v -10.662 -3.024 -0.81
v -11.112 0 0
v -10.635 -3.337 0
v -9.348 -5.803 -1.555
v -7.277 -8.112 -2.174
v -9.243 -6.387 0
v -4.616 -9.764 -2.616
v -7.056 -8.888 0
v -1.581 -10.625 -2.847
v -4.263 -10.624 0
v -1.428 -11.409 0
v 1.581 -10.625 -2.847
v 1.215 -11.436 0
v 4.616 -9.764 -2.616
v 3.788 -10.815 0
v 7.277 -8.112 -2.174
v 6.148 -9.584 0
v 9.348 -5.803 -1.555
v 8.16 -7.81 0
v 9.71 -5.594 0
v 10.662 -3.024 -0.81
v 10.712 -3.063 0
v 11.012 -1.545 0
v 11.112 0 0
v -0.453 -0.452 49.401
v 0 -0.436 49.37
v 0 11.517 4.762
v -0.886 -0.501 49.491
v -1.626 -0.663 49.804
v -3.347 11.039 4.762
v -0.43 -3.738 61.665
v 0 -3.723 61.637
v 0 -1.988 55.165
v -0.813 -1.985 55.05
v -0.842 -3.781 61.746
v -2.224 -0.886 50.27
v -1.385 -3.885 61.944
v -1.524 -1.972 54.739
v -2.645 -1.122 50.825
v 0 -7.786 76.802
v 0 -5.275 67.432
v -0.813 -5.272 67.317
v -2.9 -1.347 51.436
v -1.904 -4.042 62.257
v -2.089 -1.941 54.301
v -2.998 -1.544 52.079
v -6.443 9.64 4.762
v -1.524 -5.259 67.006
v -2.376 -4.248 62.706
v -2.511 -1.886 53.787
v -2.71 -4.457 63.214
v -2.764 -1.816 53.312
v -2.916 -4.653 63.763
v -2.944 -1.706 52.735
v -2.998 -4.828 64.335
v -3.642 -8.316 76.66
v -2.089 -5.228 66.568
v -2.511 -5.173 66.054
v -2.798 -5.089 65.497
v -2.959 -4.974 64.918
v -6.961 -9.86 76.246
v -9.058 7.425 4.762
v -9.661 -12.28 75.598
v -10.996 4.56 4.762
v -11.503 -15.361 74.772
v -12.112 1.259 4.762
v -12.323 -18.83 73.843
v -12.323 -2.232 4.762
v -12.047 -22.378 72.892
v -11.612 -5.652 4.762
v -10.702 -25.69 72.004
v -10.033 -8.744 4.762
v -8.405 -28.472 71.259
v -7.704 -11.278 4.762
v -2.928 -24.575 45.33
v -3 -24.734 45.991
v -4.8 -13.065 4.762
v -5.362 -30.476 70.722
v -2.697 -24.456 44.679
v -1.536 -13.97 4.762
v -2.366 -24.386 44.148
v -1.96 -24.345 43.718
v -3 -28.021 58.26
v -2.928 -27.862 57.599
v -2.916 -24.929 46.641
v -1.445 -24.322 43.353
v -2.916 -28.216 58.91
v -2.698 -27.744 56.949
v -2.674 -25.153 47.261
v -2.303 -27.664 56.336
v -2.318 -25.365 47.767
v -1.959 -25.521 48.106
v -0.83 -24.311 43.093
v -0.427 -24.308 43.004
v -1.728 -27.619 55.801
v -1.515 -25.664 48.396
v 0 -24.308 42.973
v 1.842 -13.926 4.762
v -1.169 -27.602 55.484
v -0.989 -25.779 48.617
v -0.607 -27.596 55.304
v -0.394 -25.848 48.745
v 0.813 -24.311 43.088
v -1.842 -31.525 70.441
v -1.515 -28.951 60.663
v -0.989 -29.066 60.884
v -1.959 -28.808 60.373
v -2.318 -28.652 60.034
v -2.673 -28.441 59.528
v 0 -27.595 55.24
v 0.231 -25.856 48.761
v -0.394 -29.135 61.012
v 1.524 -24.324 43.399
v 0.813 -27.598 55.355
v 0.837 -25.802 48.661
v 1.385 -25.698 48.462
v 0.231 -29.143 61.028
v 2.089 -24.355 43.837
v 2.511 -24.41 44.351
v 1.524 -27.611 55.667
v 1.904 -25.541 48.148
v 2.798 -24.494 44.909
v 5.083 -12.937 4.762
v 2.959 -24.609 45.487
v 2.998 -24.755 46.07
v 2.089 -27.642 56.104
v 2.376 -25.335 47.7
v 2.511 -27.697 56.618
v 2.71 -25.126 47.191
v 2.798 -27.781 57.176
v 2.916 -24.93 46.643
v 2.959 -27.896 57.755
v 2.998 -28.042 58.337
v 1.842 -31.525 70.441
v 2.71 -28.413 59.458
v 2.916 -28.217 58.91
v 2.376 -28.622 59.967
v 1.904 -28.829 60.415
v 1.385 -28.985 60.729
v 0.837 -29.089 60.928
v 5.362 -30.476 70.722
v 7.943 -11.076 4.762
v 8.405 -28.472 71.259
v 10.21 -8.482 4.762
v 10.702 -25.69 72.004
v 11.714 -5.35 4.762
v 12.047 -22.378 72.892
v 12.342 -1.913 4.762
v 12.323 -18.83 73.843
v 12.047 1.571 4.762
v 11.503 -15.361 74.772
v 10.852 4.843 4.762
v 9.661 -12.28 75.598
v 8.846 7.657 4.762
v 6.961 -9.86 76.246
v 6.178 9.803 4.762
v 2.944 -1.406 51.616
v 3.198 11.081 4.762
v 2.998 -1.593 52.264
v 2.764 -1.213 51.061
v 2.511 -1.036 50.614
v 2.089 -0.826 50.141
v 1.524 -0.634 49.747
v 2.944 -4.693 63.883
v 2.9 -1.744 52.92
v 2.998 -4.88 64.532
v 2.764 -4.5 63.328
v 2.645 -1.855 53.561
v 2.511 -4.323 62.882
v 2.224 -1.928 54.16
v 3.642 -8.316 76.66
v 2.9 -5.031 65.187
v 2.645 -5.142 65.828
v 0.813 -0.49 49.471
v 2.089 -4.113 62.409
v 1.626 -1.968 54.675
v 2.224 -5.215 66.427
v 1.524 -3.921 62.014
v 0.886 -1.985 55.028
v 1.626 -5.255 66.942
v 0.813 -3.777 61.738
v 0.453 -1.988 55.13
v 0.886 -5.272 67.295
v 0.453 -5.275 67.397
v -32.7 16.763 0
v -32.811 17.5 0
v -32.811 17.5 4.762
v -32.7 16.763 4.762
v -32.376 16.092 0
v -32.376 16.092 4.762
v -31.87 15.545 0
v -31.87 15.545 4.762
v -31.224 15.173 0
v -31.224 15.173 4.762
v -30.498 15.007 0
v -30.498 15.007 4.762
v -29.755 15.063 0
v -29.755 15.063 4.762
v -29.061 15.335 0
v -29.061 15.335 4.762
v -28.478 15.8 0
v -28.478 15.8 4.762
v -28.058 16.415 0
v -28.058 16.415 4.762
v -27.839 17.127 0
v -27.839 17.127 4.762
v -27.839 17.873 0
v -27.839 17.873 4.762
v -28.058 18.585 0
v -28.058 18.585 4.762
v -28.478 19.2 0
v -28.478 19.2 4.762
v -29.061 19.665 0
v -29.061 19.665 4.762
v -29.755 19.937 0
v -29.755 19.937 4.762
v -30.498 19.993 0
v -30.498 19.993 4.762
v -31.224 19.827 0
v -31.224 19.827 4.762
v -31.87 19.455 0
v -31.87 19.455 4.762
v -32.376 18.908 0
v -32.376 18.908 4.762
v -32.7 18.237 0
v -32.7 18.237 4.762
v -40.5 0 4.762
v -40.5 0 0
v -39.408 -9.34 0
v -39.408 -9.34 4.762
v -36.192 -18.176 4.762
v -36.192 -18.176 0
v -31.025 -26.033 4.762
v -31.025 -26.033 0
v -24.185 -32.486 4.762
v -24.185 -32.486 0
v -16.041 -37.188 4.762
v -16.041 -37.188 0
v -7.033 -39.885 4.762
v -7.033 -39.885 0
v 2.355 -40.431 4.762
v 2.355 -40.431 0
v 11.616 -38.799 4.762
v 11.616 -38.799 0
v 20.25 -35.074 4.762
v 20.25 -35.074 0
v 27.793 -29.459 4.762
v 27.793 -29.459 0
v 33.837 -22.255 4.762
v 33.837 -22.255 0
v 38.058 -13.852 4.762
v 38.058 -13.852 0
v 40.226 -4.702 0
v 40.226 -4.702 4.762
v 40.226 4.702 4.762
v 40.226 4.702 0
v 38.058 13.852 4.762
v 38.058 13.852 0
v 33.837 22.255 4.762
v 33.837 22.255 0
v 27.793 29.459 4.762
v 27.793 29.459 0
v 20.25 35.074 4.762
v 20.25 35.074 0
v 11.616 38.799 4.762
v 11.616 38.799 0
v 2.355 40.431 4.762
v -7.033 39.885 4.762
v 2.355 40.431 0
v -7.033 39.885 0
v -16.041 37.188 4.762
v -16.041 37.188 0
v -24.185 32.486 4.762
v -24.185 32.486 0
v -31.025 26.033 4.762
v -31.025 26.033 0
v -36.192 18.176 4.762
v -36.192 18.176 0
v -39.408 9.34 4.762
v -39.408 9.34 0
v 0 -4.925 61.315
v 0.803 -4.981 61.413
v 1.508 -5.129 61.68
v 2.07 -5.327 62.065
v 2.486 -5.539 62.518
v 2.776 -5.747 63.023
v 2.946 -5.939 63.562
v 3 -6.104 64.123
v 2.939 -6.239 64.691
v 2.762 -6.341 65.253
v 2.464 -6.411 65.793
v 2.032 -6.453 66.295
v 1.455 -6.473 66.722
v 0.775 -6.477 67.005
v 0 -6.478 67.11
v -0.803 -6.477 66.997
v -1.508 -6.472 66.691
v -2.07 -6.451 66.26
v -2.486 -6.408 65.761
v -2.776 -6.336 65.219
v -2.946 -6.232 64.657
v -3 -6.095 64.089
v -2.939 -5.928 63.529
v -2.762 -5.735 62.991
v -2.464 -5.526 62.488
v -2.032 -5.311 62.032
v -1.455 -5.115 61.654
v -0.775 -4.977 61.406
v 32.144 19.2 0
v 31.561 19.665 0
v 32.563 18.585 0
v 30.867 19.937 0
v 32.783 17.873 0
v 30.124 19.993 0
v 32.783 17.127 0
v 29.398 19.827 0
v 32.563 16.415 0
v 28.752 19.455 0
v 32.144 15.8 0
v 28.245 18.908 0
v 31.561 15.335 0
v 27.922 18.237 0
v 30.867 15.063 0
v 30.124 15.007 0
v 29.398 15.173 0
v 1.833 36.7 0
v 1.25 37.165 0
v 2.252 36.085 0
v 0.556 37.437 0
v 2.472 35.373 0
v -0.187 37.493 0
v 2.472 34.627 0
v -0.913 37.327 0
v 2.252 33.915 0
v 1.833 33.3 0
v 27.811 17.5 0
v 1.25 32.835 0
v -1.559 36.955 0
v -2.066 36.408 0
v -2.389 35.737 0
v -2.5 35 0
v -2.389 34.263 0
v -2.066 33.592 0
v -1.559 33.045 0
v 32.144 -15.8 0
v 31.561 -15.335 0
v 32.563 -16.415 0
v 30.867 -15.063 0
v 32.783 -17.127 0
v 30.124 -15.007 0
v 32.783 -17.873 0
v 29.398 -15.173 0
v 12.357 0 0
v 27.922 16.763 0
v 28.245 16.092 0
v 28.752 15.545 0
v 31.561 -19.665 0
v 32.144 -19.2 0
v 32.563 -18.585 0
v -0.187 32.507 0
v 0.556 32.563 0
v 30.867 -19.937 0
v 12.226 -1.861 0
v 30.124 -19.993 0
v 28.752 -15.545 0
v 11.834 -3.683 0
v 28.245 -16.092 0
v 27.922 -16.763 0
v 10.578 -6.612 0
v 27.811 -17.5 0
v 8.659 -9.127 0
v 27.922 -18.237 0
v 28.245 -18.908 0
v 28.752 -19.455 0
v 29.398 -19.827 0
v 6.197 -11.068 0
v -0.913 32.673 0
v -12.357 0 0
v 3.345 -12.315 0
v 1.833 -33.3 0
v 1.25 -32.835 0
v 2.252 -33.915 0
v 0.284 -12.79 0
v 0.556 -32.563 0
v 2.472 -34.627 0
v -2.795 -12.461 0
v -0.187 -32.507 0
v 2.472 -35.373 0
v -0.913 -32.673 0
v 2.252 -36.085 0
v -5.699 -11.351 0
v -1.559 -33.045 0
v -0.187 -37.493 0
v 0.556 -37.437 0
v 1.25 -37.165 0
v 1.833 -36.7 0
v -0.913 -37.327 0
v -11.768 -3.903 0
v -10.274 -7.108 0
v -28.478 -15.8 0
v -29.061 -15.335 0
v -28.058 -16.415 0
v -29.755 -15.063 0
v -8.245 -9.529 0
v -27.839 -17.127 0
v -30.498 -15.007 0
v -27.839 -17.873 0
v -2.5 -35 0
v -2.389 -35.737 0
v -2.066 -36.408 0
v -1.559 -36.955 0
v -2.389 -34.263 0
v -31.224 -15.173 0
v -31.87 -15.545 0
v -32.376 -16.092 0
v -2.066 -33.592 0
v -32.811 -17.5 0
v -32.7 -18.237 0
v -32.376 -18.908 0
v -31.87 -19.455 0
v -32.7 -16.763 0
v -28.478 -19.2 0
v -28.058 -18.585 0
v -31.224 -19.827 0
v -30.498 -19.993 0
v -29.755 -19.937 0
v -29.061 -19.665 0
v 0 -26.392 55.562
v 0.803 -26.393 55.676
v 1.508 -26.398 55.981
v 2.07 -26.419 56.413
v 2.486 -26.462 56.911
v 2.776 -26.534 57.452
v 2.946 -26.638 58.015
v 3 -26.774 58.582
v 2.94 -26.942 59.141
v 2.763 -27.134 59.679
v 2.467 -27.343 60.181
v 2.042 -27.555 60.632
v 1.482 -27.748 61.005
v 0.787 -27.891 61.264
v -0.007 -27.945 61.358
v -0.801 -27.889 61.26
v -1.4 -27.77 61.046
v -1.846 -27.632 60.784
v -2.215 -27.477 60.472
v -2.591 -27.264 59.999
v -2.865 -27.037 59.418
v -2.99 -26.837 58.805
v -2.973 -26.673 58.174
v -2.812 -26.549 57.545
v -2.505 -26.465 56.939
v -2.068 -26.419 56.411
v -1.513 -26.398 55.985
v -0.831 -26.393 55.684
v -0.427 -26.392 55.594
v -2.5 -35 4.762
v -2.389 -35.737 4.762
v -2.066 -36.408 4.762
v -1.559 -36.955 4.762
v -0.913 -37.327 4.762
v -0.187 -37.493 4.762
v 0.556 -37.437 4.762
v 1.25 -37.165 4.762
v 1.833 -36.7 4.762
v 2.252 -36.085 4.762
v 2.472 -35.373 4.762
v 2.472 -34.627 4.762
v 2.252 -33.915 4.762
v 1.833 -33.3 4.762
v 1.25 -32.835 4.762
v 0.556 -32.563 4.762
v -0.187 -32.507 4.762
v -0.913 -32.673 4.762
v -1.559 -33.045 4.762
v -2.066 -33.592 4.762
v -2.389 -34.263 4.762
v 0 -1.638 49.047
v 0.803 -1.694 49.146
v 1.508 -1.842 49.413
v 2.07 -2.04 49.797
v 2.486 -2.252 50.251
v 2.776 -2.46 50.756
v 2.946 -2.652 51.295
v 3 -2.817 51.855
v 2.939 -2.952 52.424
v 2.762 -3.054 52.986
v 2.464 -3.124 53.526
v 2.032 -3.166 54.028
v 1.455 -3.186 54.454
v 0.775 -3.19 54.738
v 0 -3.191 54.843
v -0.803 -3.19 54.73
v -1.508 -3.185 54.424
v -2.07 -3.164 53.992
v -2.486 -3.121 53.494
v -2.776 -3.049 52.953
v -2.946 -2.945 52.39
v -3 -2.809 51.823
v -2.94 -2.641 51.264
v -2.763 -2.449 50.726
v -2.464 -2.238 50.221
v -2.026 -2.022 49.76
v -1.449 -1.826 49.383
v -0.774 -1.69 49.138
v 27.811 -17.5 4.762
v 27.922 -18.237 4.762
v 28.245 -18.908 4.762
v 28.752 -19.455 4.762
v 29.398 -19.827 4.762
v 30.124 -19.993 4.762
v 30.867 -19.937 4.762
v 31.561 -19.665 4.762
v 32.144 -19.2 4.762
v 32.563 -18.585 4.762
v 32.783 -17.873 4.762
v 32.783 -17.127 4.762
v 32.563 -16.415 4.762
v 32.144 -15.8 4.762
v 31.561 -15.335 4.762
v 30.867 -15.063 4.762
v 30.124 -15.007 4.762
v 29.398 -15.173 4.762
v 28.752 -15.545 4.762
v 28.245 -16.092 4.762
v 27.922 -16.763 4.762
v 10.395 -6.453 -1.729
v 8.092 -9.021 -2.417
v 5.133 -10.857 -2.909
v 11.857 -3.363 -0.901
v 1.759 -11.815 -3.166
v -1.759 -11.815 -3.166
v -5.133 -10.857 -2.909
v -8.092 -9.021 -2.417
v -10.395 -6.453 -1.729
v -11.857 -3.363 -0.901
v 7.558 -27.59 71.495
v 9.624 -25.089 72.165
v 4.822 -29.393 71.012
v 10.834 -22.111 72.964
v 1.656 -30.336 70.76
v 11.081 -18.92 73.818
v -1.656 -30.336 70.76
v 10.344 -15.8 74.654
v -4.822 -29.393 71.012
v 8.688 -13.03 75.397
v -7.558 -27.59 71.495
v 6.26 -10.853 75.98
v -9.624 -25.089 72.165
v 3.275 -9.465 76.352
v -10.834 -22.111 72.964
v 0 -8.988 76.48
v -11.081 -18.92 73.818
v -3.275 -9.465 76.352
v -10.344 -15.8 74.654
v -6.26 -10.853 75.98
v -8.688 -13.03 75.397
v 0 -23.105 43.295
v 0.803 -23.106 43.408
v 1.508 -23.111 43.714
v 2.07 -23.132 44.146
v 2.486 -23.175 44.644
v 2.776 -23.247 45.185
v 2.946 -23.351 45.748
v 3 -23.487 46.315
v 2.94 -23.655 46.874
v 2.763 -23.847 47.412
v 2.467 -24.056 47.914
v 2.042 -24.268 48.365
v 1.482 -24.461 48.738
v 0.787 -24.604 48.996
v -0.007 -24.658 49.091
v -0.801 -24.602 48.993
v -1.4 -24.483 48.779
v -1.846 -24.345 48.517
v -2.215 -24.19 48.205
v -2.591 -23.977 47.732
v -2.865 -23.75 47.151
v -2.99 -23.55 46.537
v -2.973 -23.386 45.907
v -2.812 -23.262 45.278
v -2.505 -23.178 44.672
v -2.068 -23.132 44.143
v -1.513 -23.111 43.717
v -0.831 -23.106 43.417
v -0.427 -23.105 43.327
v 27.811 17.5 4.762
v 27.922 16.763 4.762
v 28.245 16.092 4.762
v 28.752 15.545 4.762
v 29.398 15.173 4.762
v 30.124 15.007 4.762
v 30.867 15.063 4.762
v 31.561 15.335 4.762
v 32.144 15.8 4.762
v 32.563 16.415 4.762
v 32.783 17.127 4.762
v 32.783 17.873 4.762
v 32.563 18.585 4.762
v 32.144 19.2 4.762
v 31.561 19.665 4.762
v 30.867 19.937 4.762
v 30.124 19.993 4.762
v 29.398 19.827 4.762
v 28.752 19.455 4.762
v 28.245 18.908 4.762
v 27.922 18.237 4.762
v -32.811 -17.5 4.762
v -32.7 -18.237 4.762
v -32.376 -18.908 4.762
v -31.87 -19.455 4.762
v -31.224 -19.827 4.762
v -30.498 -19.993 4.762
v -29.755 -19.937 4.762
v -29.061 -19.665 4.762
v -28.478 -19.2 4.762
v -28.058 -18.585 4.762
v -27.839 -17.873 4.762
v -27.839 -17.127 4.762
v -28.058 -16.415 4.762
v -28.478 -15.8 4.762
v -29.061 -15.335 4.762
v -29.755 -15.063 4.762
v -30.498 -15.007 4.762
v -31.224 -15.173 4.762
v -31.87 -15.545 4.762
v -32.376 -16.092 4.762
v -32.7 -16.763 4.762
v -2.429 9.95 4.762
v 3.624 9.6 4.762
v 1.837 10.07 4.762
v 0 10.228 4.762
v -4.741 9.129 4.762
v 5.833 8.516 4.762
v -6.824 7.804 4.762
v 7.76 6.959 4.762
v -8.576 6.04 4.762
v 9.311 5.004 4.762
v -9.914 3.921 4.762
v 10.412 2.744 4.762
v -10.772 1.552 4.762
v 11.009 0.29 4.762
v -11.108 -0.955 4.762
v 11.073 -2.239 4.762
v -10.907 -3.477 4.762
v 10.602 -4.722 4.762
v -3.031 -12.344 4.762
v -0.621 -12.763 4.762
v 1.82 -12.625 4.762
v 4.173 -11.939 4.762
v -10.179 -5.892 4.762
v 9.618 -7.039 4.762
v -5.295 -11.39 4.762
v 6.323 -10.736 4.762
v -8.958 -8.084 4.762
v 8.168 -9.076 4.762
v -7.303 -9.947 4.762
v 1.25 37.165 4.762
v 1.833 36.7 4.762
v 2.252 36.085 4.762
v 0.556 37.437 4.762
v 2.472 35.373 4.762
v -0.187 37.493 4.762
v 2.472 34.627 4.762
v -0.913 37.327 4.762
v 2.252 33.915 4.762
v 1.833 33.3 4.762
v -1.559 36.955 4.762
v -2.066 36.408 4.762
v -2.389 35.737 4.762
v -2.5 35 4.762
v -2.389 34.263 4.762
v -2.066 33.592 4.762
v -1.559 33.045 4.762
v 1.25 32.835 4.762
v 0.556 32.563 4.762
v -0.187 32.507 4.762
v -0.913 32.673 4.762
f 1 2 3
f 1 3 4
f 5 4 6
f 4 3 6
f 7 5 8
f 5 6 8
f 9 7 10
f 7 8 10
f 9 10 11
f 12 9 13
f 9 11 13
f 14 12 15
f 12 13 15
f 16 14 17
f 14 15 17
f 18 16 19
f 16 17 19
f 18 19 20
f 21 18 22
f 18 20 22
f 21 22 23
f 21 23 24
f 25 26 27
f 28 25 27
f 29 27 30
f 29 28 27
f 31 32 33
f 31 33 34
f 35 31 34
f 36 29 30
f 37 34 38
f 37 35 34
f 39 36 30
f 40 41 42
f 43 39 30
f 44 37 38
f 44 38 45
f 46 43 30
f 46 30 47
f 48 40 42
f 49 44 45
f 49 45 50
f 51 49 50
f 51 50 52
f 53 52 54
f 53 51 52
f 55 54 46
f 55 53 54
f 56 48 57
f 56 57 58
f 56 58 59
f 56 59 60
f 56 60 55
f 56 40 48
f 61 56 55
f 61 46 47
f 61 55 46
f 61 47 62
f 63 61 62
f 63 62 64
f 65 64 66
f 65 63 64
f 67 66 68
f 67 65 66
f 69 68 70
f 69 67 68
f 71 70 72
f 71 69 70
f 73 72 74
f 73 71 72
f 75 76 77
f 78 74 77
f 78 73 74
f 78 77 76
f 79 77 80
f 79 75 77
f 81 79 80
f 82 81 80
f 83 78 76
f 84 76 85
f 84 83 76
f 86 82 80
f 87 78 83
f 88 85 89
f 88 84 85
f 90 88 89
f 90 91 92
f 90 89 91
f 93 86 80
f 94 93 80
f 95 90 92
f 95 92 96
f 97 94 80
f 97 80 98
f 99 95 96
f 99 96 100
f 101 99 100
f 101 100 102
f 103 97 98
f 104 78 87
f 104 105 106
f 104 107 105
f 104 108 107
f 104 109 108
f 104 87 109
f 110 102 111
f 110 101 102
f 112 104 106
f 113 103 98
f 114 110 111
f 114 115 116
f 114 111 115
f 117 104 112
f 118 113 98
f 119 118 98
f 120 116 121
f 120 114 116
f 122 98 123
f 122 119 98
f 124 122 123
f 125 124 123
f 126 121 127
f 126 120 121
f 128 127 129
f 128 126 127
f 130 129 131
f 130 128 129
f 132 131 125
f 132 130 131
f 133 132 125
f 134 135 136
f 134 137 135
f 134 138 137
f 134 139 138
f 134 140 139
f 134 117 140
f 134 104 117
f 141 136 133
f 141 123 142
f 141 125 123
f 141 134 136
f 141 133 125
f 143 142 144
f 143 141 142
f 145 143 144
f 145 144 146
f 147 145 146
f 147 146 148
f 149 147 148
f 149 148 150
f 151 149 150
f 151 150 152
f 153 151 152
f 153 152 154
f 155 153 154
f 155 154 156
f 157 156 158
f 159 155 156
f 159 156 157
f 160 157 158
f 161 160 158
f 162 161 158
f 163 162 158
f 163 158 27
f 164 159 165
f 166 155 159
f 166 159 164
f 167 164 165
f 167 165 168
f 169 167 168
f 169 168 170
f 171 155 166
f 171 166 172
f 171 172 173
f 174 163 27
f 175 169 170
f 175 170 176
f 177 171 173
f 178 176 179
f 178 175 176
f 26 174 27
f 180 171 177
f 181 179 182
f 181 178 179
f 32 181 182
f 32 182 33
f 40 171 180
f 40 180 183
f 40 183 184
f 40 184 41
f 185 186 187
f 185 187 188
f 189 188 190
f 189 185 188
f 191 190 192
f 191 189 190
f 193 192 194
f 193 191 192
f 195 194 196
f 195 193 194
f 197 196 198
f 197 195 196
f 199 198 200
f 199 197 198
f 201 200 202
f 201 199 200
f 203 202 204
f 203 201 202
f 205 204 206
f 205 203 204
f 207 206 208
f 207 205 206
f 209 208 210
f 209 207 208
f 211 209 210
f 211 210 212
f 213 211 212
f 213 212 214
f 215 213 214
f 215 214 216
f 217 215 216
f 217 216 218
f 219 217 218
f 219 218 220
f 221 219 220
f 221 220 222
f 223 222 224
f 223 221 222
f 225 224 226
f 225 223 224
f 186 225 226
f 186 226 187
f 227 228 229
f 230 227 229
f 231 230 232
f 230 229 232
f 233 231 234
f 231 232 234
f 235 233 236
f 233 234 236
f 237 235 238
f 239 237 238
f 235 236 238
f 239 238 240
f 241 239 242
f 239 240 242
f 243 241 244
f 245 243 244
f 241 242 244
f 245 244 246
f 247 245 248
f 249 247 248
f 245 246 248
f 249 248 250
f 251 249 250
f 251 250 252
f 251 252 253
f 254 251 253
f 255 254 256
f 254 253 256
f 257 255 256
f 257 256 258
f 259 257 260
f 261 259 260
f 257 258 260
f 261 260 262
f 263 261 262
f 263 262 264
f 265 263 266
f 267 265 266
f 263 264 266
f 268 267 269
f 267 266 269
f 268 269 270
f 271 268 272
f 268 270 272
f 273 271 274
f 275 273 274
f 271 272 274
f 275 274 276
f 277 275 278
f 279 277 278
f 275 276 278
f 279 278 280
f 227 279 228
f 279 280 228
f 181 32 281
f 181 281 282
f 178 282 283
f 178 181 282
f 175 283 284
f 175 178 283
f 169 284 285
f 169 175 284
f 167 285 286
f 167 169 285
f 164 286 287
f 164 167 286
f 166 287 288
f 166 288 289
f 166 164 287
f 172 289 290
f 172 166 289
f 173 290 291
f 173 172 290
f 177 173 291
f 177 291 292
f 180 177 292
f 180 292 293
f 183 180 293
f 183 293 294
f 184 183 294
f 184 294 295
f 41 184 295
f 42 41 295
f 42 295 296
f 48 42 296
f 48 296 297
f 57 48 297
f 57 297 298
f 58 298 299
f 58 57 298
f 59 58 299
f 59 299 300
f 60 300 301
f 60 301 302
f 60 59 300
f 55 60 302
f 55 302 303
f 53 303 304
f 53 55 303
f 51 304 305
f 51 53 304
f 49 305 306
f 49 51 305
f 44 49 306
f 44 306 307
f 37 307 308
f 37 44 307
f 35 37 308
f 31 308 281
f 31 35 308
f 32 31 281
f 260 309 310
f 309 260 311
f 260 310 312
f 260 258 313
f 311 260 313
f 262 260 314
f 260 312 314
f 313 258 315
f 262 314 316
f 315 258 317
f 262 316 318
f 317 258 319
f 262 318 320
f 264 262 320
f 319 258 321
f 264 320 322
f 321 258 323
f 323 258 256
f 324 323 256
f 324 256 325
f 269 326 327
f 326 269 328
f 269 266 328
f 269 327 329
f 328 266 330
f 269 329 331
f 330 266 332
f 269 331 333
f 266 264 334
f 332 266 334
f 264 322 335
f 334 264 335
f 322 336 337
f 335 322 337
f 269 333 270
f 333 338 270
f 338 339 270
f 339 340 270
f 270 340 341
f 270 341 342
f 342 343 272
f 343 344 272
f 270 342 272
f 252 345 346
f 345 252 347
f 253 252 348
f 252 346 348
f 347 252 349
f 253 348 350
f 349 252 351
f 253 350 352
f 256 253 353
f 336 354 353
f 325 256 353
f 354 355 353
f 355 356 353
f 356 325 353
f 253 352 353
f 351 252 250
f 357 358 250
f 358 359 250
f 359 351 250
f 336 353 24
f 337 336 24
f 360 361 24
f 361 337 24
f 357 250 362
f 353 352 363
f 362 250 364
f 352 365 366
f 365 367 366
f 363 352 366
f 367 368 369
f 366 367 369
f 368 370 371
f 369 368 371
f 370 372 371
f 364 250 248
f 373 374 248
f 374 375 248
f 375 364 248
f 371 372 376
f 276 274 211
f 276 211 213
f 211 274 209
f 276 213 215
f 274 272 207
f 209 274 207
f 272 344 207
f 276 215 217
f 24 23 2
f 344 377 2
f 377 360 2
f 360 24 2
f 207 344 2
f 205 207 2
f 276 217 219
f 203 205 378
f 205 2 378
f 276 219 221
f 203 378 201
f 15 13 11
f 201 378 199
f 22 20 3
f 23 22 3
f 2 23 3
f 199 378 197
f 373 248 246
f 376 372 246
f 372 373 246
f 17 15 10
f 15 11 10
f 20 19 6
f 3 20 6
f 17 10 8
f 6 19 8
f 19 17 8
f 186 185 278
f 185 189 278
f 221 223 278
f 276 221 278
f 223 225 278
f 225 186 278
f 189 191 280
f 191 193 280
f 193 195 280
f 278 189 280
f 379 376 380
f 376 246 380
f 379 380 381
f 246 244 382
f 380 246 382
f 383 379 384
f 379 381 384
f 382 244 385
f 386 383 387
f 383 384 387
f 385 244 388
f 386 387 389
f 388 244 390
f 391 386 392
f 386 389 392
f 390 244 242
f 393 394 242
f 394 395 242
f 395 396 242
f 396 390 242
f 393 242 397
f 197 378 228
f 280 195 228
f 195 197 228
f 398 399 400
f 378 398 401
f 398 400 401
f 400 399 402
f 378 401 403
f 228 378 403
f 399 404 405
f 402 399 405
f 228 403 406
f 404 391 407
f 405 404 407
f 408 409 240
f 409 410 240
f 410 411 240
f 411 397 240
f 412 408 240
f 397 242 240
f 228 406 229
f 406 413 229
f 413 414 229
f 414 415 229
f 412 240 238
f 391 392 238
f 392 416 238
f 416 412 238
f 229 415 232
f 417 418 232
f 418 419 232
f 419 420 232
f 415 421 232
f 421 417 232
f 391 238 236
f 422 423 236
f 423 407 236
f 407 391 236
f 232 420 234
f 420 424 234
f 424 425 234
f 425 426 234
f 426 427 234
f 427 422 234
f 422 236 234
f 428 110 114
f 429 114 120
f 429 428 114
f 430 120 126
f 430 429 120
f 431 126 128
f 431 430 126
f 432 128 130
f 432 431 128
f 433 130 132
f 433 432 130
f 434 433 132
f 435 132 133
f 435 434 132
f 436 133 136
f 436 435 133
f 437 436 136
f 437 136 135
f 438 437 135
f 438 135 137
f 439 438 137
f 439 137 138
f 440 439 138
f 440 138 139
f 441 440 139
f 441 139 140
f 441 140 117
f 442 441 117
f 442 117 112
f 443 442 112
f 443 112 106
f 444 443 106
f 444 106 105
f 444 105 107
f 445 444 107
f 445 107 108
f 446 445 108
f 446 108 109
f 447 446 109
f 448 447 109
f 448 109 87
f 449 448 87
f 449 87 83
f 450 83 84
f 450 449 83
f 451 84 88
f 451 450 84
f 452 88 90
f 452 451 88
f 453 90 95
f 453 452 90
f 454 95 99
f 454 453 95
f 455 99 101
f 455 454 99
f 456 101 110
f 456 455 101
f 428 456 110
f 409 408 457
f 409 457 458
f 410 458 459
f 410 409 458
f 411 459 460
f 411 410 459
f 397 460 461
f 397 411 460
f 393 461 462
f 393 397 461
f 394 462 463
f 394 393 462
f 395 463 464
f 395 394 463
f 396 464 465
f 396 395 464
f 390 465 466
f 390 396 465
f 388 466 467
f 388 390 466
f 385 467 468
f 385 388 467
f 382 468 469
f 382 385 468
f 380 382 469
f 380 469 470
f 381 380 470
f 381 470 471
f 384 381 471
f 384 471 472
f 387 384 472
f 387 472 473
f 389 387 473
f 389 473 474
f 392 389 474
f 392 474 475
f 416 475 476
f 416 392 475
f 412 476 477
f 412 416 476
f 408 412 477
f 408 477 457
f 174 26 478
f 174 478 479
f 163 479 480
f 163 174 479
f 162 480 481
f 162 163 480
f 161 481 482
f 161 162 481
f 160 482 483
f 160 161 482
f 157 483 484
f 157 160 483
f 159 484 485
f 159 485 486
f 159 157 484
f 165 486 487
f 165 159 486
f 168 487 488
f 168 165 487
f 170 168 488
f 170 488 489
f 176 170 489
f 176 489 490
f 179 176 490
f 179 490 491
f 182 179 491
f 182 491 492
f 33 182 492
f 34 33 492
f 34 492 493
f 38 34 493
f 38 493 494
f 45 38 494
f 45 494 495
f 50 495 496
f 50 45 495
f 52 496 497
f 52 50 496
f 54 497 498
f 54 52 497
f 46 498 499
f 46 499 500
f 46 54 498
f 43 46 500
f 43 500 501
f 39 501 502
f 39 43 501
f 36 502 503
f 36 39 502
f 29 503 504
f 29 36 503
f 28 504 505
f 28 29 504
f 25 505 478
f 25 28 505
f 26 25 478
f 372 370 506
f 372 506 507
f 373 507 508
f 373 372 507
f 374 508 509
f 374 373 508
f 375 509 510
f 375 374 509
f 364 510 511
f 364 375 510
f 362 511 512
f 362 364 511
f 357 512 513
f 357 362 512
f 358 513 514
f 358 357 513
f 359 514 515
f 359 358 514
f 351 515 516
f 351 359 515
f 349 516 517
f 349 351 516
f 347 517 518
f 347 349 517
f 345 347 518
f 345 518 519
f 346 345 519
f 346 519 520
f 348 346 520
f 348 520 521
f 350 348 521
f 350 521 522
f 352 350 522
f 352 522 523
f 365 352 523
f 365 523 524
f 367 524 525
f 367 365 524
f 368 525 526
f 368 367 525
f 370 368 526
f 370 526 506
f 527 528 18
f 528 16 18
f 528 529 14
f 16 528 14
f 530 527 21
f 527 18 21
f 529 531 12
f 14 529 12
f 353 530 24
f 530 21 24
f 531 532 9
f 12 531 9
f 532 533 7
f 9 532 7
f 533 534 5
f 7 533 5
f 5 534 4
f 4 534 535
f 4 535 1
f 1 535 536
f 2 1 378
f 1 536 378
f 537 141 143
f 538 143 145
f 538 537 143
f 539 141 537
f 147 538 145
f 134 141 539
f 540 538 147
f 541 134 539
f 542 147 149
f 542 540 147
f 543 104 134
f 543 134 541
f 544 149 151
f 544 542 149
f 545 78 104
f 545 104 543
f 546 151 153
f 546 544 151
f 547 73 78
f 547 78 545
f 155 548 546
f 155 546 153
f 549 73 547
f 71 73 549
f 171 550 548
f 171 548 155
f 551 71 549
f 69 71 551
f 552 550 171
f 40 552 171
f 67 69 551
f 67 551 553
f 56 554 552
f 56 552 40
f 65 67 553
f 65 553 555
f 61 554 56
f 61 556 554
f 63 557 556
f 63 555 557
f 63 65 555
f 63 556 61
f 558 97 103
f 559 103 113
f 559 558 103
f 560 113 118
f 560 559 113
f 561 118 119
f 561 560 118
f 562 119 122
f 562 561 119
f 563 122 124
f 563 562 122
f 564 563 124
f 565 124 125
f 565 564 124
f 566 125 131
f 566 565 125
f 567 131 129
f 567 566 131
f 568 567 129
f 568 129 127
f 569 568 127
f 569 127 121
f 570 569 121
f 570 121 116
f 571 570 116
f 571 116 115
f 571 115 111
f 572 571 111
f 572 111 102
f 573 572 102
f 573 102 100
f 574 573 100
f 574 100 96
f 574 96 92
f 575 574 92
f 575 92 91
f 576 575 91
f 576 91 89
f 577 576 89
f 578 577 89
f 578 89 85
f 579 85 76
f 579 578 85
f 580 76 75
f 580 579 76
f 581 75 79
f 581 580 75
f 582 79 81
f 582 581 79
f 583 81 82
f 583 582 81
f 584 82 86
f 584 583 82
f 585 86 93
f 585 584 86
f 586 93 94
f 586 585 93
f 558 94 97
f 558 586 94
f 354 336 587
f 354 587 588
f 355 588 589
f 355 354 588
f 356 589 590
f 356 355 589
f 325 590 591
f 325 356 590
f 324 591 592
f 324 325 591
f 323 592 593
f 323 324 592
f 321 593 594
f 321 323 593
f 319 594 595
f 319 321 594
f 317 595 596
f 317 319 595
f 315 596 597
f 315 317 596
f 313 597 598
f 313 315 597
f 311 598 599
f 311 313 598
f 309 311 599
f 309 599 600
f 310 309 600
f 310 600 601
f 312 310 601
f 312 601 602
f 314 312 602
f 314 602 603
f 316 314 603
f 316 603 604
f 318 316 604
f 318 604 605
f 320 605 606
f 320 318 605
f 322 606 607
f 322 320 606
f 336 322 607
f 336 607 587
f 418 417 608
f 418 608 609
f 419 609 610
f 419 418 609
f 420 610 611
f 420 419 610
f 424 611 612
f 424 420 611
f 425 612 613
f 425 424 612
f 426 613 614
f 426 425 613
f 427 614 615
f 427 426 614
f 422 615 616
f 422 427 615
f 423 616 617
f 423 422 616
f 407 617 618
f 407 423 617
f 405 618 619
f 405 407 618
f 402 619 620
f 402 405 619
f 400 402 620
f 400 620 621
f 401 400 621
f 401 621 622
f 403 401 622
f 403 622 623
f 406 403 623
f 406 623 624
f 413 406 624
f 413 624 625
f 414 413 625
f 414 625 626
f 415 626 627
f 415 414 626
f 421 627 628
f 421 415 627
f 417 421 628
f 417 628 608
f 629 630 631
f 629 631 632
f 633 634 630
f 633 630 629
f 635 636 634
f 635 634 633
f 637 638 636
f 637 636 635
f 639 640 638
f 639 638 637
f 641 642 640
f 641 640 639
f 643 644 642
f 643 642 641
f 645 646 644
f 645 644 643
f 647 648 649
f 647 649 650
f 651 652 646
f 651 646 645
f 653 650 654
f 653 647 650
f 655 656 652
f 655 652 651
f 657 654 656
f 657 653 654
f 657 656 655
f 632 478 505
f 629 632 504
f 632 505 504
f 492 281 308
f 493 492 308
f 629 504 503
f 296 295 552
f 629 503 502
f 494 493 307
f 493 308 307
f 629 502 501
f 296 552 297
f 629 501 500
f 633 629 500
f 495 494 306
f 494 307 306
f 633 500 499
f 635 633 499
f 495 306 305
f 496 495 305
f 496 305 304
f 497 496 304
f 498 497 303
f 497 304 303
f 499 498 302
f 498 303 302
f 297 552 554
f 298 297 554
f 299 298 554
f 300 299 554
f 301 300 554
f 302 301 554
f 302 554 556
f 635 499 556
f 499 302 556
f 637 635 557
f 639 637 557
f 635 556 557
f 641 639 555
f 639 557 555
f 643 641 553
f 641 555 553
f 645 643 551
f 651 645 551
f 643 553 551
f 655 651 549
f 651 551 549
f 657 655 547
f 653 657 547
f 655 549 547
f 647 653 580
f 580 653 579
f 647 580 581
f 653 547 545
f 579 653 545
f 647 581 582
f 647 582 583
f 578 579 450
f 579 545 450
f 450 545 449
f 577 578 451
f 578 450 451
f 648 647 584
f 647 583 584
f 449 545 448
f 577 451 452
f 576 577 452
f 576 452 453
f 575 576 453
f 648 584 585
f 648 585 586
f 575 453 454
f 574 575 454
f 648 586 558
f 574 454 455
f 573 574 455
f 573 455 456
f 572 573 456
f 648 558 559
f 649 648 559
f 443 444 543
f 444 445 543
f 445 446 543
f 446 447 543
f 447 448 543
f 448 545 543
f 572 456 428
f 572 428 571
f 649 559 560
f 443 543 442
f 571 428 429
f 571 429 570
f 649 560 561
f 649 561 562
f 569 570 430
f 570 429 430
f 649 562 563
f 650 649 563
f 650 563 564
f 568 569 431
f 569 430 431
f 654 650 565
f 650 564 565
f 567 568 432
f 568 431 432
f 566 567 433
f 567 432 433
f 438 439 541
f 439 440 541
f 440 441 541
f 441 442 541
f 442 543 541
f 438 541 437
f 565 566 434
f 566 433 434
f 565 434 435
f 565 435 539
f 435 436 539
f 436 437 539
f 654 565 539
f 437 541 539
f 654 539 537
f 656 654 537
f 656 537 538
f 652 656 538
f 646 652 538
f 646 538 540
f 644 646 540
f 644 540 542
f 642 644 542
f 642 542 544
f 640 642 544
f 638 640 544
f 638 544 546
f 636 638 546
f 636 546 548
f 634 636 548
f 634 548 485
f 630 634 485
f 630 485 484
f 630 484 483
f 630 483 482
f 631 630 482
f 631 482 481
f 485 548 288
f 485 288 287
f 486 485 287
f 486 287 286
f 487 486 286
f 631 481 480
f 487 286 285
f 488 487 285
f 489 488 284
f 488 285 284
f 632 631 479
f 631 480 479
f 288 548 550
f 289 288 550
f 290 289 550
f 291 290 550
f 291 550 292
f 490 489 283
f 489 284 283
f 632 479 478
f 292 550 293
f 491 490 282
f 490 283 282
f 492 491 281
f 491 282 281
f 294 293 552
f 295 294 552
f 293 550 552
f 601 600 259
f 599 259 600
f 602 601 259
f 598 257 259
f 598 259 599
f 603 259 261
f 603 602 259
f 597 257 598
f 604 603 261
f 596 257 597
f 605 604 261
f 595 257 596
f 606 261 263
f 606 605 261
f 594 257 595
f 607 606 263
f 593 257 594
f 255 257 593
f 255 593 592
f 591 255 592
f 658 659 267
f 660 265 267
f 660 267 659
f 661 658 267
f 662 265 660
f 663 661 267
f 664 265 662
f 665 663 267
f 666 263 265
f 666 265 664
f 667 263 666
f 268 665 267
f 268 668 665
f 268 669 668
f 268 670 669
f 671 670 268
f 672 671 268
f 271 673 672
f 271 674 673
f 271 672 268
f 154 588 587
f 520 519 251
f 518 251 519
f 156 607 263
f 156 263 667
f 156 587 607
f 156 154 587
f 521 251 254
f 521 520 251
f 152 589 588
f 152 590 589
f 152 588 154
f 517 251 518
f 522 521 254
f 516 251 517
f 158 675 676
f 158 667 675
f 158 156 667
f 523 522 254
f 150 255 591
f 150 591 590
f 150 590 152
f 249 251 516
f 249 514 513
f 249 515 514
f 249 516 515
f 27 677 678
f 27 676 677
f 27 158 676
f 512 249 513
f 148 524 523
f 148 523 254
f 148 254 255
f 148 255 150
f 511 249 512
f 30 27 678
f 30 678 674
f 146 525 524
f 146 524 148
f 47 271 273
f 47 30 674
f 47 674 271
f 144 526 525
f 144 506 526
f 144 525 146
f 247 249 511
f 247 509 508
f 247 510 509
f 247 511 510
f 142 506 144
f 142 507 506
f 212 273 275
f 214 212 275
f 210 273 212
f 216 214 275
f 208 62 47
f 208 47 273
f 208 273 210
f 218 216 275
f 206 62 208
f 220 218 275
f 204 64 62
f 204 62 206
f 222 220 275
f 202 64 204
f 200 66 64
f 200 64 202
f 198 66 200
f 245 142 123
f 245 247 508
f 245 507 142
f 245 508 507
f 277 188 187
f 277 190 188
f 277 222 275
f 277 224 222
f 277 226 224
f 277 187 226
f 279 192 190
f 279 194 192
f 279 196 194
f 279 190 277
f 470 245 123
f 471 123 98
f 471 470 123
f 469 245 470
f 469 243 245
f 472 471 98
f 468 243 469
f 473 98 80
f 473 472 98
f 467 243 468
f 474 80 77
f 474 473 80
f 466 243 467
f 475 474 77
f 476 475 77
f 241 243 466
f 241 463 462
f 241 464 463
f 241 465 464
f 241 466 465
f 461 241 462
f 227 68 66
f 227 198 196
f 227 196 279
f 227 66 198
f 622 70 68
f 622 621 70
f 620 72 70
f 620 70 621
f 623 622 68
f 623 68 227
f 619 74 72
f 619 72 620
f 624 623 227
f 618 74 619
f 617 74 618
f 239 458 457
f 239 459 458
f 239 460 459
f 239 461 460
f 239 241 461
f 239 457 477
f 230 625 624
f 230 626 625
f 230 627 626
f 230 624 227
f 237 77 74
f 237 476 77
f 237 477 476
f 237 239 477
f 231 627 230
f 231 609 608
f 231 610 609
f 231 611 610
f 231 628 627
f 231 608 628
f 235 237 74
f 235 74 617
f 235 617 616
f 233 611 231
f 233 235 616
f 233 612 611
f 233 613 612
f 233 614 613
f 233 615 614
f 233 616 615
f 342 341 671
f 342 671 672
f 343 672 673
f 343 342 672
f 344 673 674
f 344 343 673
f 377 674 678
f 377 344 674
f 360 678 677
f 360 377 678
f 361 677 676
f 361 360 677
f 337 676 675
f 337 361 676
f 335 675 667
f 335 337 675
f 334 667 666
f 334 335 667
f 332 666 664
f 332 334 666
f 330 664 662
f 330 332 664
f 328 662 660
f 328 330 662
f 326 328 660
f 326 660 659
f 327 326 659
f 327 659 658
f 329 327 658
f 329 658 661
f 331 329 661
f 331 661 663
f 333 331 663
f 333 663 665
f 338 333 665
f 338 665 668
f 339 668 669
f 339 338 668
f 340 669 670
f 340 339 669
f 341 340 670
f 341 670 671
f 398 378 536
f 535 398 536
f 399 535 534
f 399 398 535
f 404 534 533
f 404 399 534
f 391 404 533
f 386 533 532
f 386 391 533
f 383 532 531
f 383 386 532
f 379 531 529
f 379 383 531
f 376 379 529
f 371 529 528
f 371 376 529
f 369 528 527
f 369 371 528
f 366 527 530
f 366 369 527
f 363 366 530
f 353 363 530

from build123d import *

# Parameters (mm, degrees)
SKETCH1_R               = 40.5
SKETCH1_R_2             = 2.5
BOSS_EXTRUDE1_DEPTH     = 4.7625
SWEEP_THIN1_PROFILE_R   = 12.3571
SWEEP_THIN1_PROFILE_R_2 = 11.1125
CUT_EXTRUDE2_DEPTH      = 96.807184511
CUT_EXTRUDE2_DEPTH_BACK = 96.807184511
SKETCH18_R              = 3


with BuildPart() as part:
    # Sketch1 → Boss-Extrude1 (new body)
    with BuildSketch(Plane.XY):
        with Locations(Location((0, 0, 0), (0, 0, 180))):
            Circle(SKETCH1_R)
        with Locations(Location((-30.310889132, -17.5, 0), (0, 0, 180))):
            Circle(SKETCH1_R_2, mode=Mode.SUBTRACT)
        with Locations(Location((0, -35, 0), (0, 0, 180))):
            Circle(SKETCH1_R_2, mode=Mode.SUBTRACT)
        with Locations(Location((30.310889132, -17.5, 0), (0, 0, 180))):
            Circle(SKETCH1_R_2, mode=Mode.SUBTRACT)
        with Locations(Location((30.310889132, 17.5, 0), (0, 0, 180))):
            Circle(SKETCH1_R_2, mode=Mode.SUBTRACT)
        with Locations(Location((0, 35, 0), (0, 0, 180))):
            Circle(SKETCH1_R_2, mode=Mode.SUBTRACT)
        with Locations(Location((-30.310889132, 17.5, 0), (0, 0, 180))):
            Circle(SKETCH1_R_2, mode=Mode.SUBTRACT)
    extrude(amount=BOSS_EXTRUDE1_DEPTH)

    # Sweep-Thin1: sweep along a path in Sketch6
    with BuildLine(Plane(origin=(0, 0, 0), x_dir=(0, 0, -1), z_dir=(1, 0, 0))) as sweep_thin1_path:
        Line((0, 0), (-73.603547963, -19.722011237))
    # Sweep-Thin1 profile (on start of the path) → Sweep-Thin1 (sweep)
    with BuildSketch(Plane(origin=(0, 0, 0), x_dir=(0, 0.965925826289069, 0.25881904510251813), z_dir=(0, -0.25881904510251813, 0.965925826289069))):
        Circle(SWEEP_THIN1_PROFILE_R)
        Circle(SWEEP_THIN1_PROFILE_R_2, mode=Mode.SUBTRACT)
    sweep(path=sweep_thin1_path.line)

    # Sketch18 → Cut-Extrude2 (cut, two sides: drawn at the far end of the back side and taken through both)
    with BuildSketch(Plane(origin=(0, 0, 0), x_dir=(-1, 0, 0), z_dir=(0, -0.9659258262890691, -0.25881904510251813)).offset(-CUT_EXTRUDE2_DEPTH_BACK)):
        with Locations(Location((0, -63.5, 0), (0, 0, 90))):
            Circle(SKETCH18_R)
        with Locations(Location((0, -50.8, 0), (0, 0, 90))):
            Circle(SKETCH18_R)
    extrude(amount=CUT_EXTRUDE2_DEPTH + CUT_EXTRUDE2_DEPTH_BACK, mode=Mode.SUBTRACT)


solid = part.part
